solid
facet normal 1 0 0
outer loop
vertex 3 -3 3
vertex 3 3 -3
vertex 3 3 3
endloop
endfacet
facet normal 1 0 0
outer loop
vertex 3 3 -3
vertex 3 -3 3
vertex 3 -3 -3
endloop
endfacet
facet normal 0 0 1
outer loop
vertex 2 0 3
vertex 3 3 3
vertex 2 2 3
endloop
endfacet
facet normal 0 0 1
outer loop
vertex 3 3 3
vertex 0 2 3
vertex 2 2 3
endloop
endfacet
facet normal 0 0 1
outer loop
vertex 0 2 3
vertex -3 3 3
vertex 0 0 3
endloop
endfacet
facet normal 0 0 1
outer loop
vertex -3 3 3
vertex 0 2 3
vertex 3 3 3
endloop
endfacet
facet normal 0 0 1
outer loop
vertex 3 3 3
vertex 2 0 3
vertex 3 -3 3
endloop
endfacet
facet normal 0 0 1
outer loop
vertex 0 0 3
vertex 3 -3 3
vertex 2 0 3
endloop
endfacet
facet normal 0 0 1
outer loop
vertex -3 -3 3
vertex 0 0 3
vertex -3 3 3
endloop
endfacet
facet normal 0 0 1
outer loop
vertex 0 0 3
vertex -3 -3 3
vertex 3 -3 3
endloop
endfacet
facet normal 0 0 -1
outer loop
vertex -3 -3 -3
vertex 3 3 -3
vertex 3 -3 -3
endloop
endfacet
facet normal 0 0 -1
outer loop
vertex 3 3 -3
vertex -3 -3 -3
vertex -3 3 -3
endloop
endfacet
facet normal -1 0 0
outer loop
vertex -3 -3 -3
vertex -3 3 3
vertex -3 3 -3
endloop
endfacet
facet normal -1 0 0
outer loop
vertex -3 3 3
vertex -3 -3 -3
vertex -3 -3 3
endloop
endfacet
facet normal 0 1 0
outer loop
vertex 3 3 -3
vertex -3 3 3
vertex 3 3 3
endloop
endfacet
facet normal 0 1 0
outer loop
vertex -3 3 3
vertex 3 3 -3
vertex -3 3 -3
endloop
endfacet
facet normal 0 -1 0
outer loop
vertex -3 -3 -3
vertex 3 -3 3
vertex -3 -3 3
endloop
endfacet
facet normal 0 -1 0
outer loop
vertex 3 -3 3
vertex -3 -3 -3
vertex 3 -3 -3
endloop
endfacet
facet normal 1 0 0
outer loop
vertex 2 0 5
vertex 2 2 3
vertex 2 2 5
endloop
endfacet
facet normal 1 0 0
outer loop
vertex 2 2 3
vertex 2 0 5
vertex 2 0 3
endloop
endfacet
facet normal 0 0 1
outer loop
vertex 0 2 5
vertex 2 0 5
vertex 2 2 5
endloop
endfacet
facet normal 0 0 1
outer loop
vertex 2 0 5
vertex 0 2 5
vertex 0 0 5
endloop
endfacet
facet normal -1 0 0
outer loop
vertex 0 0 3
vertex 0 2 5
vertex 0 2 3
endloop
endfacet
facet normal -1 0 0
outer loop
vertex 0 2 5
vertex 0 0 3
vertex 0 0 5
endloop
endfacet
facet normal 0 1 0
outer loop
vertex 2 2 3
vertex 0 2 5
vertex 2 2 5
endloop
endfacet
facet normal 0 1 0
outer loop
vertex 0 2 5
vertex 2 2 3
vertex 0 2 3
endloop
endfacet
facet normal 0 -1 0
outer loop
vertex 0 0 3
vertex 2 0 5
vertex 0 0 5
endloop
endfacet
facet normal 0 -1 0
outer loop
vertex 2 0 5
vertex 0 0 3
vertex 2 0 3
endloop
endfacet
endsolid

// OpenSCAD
union() {
  translate([-3, -3, -3]) cube([6, 6, 6]);
  translate([0, 0, 3]) cube([2, 2, 2]);
}
